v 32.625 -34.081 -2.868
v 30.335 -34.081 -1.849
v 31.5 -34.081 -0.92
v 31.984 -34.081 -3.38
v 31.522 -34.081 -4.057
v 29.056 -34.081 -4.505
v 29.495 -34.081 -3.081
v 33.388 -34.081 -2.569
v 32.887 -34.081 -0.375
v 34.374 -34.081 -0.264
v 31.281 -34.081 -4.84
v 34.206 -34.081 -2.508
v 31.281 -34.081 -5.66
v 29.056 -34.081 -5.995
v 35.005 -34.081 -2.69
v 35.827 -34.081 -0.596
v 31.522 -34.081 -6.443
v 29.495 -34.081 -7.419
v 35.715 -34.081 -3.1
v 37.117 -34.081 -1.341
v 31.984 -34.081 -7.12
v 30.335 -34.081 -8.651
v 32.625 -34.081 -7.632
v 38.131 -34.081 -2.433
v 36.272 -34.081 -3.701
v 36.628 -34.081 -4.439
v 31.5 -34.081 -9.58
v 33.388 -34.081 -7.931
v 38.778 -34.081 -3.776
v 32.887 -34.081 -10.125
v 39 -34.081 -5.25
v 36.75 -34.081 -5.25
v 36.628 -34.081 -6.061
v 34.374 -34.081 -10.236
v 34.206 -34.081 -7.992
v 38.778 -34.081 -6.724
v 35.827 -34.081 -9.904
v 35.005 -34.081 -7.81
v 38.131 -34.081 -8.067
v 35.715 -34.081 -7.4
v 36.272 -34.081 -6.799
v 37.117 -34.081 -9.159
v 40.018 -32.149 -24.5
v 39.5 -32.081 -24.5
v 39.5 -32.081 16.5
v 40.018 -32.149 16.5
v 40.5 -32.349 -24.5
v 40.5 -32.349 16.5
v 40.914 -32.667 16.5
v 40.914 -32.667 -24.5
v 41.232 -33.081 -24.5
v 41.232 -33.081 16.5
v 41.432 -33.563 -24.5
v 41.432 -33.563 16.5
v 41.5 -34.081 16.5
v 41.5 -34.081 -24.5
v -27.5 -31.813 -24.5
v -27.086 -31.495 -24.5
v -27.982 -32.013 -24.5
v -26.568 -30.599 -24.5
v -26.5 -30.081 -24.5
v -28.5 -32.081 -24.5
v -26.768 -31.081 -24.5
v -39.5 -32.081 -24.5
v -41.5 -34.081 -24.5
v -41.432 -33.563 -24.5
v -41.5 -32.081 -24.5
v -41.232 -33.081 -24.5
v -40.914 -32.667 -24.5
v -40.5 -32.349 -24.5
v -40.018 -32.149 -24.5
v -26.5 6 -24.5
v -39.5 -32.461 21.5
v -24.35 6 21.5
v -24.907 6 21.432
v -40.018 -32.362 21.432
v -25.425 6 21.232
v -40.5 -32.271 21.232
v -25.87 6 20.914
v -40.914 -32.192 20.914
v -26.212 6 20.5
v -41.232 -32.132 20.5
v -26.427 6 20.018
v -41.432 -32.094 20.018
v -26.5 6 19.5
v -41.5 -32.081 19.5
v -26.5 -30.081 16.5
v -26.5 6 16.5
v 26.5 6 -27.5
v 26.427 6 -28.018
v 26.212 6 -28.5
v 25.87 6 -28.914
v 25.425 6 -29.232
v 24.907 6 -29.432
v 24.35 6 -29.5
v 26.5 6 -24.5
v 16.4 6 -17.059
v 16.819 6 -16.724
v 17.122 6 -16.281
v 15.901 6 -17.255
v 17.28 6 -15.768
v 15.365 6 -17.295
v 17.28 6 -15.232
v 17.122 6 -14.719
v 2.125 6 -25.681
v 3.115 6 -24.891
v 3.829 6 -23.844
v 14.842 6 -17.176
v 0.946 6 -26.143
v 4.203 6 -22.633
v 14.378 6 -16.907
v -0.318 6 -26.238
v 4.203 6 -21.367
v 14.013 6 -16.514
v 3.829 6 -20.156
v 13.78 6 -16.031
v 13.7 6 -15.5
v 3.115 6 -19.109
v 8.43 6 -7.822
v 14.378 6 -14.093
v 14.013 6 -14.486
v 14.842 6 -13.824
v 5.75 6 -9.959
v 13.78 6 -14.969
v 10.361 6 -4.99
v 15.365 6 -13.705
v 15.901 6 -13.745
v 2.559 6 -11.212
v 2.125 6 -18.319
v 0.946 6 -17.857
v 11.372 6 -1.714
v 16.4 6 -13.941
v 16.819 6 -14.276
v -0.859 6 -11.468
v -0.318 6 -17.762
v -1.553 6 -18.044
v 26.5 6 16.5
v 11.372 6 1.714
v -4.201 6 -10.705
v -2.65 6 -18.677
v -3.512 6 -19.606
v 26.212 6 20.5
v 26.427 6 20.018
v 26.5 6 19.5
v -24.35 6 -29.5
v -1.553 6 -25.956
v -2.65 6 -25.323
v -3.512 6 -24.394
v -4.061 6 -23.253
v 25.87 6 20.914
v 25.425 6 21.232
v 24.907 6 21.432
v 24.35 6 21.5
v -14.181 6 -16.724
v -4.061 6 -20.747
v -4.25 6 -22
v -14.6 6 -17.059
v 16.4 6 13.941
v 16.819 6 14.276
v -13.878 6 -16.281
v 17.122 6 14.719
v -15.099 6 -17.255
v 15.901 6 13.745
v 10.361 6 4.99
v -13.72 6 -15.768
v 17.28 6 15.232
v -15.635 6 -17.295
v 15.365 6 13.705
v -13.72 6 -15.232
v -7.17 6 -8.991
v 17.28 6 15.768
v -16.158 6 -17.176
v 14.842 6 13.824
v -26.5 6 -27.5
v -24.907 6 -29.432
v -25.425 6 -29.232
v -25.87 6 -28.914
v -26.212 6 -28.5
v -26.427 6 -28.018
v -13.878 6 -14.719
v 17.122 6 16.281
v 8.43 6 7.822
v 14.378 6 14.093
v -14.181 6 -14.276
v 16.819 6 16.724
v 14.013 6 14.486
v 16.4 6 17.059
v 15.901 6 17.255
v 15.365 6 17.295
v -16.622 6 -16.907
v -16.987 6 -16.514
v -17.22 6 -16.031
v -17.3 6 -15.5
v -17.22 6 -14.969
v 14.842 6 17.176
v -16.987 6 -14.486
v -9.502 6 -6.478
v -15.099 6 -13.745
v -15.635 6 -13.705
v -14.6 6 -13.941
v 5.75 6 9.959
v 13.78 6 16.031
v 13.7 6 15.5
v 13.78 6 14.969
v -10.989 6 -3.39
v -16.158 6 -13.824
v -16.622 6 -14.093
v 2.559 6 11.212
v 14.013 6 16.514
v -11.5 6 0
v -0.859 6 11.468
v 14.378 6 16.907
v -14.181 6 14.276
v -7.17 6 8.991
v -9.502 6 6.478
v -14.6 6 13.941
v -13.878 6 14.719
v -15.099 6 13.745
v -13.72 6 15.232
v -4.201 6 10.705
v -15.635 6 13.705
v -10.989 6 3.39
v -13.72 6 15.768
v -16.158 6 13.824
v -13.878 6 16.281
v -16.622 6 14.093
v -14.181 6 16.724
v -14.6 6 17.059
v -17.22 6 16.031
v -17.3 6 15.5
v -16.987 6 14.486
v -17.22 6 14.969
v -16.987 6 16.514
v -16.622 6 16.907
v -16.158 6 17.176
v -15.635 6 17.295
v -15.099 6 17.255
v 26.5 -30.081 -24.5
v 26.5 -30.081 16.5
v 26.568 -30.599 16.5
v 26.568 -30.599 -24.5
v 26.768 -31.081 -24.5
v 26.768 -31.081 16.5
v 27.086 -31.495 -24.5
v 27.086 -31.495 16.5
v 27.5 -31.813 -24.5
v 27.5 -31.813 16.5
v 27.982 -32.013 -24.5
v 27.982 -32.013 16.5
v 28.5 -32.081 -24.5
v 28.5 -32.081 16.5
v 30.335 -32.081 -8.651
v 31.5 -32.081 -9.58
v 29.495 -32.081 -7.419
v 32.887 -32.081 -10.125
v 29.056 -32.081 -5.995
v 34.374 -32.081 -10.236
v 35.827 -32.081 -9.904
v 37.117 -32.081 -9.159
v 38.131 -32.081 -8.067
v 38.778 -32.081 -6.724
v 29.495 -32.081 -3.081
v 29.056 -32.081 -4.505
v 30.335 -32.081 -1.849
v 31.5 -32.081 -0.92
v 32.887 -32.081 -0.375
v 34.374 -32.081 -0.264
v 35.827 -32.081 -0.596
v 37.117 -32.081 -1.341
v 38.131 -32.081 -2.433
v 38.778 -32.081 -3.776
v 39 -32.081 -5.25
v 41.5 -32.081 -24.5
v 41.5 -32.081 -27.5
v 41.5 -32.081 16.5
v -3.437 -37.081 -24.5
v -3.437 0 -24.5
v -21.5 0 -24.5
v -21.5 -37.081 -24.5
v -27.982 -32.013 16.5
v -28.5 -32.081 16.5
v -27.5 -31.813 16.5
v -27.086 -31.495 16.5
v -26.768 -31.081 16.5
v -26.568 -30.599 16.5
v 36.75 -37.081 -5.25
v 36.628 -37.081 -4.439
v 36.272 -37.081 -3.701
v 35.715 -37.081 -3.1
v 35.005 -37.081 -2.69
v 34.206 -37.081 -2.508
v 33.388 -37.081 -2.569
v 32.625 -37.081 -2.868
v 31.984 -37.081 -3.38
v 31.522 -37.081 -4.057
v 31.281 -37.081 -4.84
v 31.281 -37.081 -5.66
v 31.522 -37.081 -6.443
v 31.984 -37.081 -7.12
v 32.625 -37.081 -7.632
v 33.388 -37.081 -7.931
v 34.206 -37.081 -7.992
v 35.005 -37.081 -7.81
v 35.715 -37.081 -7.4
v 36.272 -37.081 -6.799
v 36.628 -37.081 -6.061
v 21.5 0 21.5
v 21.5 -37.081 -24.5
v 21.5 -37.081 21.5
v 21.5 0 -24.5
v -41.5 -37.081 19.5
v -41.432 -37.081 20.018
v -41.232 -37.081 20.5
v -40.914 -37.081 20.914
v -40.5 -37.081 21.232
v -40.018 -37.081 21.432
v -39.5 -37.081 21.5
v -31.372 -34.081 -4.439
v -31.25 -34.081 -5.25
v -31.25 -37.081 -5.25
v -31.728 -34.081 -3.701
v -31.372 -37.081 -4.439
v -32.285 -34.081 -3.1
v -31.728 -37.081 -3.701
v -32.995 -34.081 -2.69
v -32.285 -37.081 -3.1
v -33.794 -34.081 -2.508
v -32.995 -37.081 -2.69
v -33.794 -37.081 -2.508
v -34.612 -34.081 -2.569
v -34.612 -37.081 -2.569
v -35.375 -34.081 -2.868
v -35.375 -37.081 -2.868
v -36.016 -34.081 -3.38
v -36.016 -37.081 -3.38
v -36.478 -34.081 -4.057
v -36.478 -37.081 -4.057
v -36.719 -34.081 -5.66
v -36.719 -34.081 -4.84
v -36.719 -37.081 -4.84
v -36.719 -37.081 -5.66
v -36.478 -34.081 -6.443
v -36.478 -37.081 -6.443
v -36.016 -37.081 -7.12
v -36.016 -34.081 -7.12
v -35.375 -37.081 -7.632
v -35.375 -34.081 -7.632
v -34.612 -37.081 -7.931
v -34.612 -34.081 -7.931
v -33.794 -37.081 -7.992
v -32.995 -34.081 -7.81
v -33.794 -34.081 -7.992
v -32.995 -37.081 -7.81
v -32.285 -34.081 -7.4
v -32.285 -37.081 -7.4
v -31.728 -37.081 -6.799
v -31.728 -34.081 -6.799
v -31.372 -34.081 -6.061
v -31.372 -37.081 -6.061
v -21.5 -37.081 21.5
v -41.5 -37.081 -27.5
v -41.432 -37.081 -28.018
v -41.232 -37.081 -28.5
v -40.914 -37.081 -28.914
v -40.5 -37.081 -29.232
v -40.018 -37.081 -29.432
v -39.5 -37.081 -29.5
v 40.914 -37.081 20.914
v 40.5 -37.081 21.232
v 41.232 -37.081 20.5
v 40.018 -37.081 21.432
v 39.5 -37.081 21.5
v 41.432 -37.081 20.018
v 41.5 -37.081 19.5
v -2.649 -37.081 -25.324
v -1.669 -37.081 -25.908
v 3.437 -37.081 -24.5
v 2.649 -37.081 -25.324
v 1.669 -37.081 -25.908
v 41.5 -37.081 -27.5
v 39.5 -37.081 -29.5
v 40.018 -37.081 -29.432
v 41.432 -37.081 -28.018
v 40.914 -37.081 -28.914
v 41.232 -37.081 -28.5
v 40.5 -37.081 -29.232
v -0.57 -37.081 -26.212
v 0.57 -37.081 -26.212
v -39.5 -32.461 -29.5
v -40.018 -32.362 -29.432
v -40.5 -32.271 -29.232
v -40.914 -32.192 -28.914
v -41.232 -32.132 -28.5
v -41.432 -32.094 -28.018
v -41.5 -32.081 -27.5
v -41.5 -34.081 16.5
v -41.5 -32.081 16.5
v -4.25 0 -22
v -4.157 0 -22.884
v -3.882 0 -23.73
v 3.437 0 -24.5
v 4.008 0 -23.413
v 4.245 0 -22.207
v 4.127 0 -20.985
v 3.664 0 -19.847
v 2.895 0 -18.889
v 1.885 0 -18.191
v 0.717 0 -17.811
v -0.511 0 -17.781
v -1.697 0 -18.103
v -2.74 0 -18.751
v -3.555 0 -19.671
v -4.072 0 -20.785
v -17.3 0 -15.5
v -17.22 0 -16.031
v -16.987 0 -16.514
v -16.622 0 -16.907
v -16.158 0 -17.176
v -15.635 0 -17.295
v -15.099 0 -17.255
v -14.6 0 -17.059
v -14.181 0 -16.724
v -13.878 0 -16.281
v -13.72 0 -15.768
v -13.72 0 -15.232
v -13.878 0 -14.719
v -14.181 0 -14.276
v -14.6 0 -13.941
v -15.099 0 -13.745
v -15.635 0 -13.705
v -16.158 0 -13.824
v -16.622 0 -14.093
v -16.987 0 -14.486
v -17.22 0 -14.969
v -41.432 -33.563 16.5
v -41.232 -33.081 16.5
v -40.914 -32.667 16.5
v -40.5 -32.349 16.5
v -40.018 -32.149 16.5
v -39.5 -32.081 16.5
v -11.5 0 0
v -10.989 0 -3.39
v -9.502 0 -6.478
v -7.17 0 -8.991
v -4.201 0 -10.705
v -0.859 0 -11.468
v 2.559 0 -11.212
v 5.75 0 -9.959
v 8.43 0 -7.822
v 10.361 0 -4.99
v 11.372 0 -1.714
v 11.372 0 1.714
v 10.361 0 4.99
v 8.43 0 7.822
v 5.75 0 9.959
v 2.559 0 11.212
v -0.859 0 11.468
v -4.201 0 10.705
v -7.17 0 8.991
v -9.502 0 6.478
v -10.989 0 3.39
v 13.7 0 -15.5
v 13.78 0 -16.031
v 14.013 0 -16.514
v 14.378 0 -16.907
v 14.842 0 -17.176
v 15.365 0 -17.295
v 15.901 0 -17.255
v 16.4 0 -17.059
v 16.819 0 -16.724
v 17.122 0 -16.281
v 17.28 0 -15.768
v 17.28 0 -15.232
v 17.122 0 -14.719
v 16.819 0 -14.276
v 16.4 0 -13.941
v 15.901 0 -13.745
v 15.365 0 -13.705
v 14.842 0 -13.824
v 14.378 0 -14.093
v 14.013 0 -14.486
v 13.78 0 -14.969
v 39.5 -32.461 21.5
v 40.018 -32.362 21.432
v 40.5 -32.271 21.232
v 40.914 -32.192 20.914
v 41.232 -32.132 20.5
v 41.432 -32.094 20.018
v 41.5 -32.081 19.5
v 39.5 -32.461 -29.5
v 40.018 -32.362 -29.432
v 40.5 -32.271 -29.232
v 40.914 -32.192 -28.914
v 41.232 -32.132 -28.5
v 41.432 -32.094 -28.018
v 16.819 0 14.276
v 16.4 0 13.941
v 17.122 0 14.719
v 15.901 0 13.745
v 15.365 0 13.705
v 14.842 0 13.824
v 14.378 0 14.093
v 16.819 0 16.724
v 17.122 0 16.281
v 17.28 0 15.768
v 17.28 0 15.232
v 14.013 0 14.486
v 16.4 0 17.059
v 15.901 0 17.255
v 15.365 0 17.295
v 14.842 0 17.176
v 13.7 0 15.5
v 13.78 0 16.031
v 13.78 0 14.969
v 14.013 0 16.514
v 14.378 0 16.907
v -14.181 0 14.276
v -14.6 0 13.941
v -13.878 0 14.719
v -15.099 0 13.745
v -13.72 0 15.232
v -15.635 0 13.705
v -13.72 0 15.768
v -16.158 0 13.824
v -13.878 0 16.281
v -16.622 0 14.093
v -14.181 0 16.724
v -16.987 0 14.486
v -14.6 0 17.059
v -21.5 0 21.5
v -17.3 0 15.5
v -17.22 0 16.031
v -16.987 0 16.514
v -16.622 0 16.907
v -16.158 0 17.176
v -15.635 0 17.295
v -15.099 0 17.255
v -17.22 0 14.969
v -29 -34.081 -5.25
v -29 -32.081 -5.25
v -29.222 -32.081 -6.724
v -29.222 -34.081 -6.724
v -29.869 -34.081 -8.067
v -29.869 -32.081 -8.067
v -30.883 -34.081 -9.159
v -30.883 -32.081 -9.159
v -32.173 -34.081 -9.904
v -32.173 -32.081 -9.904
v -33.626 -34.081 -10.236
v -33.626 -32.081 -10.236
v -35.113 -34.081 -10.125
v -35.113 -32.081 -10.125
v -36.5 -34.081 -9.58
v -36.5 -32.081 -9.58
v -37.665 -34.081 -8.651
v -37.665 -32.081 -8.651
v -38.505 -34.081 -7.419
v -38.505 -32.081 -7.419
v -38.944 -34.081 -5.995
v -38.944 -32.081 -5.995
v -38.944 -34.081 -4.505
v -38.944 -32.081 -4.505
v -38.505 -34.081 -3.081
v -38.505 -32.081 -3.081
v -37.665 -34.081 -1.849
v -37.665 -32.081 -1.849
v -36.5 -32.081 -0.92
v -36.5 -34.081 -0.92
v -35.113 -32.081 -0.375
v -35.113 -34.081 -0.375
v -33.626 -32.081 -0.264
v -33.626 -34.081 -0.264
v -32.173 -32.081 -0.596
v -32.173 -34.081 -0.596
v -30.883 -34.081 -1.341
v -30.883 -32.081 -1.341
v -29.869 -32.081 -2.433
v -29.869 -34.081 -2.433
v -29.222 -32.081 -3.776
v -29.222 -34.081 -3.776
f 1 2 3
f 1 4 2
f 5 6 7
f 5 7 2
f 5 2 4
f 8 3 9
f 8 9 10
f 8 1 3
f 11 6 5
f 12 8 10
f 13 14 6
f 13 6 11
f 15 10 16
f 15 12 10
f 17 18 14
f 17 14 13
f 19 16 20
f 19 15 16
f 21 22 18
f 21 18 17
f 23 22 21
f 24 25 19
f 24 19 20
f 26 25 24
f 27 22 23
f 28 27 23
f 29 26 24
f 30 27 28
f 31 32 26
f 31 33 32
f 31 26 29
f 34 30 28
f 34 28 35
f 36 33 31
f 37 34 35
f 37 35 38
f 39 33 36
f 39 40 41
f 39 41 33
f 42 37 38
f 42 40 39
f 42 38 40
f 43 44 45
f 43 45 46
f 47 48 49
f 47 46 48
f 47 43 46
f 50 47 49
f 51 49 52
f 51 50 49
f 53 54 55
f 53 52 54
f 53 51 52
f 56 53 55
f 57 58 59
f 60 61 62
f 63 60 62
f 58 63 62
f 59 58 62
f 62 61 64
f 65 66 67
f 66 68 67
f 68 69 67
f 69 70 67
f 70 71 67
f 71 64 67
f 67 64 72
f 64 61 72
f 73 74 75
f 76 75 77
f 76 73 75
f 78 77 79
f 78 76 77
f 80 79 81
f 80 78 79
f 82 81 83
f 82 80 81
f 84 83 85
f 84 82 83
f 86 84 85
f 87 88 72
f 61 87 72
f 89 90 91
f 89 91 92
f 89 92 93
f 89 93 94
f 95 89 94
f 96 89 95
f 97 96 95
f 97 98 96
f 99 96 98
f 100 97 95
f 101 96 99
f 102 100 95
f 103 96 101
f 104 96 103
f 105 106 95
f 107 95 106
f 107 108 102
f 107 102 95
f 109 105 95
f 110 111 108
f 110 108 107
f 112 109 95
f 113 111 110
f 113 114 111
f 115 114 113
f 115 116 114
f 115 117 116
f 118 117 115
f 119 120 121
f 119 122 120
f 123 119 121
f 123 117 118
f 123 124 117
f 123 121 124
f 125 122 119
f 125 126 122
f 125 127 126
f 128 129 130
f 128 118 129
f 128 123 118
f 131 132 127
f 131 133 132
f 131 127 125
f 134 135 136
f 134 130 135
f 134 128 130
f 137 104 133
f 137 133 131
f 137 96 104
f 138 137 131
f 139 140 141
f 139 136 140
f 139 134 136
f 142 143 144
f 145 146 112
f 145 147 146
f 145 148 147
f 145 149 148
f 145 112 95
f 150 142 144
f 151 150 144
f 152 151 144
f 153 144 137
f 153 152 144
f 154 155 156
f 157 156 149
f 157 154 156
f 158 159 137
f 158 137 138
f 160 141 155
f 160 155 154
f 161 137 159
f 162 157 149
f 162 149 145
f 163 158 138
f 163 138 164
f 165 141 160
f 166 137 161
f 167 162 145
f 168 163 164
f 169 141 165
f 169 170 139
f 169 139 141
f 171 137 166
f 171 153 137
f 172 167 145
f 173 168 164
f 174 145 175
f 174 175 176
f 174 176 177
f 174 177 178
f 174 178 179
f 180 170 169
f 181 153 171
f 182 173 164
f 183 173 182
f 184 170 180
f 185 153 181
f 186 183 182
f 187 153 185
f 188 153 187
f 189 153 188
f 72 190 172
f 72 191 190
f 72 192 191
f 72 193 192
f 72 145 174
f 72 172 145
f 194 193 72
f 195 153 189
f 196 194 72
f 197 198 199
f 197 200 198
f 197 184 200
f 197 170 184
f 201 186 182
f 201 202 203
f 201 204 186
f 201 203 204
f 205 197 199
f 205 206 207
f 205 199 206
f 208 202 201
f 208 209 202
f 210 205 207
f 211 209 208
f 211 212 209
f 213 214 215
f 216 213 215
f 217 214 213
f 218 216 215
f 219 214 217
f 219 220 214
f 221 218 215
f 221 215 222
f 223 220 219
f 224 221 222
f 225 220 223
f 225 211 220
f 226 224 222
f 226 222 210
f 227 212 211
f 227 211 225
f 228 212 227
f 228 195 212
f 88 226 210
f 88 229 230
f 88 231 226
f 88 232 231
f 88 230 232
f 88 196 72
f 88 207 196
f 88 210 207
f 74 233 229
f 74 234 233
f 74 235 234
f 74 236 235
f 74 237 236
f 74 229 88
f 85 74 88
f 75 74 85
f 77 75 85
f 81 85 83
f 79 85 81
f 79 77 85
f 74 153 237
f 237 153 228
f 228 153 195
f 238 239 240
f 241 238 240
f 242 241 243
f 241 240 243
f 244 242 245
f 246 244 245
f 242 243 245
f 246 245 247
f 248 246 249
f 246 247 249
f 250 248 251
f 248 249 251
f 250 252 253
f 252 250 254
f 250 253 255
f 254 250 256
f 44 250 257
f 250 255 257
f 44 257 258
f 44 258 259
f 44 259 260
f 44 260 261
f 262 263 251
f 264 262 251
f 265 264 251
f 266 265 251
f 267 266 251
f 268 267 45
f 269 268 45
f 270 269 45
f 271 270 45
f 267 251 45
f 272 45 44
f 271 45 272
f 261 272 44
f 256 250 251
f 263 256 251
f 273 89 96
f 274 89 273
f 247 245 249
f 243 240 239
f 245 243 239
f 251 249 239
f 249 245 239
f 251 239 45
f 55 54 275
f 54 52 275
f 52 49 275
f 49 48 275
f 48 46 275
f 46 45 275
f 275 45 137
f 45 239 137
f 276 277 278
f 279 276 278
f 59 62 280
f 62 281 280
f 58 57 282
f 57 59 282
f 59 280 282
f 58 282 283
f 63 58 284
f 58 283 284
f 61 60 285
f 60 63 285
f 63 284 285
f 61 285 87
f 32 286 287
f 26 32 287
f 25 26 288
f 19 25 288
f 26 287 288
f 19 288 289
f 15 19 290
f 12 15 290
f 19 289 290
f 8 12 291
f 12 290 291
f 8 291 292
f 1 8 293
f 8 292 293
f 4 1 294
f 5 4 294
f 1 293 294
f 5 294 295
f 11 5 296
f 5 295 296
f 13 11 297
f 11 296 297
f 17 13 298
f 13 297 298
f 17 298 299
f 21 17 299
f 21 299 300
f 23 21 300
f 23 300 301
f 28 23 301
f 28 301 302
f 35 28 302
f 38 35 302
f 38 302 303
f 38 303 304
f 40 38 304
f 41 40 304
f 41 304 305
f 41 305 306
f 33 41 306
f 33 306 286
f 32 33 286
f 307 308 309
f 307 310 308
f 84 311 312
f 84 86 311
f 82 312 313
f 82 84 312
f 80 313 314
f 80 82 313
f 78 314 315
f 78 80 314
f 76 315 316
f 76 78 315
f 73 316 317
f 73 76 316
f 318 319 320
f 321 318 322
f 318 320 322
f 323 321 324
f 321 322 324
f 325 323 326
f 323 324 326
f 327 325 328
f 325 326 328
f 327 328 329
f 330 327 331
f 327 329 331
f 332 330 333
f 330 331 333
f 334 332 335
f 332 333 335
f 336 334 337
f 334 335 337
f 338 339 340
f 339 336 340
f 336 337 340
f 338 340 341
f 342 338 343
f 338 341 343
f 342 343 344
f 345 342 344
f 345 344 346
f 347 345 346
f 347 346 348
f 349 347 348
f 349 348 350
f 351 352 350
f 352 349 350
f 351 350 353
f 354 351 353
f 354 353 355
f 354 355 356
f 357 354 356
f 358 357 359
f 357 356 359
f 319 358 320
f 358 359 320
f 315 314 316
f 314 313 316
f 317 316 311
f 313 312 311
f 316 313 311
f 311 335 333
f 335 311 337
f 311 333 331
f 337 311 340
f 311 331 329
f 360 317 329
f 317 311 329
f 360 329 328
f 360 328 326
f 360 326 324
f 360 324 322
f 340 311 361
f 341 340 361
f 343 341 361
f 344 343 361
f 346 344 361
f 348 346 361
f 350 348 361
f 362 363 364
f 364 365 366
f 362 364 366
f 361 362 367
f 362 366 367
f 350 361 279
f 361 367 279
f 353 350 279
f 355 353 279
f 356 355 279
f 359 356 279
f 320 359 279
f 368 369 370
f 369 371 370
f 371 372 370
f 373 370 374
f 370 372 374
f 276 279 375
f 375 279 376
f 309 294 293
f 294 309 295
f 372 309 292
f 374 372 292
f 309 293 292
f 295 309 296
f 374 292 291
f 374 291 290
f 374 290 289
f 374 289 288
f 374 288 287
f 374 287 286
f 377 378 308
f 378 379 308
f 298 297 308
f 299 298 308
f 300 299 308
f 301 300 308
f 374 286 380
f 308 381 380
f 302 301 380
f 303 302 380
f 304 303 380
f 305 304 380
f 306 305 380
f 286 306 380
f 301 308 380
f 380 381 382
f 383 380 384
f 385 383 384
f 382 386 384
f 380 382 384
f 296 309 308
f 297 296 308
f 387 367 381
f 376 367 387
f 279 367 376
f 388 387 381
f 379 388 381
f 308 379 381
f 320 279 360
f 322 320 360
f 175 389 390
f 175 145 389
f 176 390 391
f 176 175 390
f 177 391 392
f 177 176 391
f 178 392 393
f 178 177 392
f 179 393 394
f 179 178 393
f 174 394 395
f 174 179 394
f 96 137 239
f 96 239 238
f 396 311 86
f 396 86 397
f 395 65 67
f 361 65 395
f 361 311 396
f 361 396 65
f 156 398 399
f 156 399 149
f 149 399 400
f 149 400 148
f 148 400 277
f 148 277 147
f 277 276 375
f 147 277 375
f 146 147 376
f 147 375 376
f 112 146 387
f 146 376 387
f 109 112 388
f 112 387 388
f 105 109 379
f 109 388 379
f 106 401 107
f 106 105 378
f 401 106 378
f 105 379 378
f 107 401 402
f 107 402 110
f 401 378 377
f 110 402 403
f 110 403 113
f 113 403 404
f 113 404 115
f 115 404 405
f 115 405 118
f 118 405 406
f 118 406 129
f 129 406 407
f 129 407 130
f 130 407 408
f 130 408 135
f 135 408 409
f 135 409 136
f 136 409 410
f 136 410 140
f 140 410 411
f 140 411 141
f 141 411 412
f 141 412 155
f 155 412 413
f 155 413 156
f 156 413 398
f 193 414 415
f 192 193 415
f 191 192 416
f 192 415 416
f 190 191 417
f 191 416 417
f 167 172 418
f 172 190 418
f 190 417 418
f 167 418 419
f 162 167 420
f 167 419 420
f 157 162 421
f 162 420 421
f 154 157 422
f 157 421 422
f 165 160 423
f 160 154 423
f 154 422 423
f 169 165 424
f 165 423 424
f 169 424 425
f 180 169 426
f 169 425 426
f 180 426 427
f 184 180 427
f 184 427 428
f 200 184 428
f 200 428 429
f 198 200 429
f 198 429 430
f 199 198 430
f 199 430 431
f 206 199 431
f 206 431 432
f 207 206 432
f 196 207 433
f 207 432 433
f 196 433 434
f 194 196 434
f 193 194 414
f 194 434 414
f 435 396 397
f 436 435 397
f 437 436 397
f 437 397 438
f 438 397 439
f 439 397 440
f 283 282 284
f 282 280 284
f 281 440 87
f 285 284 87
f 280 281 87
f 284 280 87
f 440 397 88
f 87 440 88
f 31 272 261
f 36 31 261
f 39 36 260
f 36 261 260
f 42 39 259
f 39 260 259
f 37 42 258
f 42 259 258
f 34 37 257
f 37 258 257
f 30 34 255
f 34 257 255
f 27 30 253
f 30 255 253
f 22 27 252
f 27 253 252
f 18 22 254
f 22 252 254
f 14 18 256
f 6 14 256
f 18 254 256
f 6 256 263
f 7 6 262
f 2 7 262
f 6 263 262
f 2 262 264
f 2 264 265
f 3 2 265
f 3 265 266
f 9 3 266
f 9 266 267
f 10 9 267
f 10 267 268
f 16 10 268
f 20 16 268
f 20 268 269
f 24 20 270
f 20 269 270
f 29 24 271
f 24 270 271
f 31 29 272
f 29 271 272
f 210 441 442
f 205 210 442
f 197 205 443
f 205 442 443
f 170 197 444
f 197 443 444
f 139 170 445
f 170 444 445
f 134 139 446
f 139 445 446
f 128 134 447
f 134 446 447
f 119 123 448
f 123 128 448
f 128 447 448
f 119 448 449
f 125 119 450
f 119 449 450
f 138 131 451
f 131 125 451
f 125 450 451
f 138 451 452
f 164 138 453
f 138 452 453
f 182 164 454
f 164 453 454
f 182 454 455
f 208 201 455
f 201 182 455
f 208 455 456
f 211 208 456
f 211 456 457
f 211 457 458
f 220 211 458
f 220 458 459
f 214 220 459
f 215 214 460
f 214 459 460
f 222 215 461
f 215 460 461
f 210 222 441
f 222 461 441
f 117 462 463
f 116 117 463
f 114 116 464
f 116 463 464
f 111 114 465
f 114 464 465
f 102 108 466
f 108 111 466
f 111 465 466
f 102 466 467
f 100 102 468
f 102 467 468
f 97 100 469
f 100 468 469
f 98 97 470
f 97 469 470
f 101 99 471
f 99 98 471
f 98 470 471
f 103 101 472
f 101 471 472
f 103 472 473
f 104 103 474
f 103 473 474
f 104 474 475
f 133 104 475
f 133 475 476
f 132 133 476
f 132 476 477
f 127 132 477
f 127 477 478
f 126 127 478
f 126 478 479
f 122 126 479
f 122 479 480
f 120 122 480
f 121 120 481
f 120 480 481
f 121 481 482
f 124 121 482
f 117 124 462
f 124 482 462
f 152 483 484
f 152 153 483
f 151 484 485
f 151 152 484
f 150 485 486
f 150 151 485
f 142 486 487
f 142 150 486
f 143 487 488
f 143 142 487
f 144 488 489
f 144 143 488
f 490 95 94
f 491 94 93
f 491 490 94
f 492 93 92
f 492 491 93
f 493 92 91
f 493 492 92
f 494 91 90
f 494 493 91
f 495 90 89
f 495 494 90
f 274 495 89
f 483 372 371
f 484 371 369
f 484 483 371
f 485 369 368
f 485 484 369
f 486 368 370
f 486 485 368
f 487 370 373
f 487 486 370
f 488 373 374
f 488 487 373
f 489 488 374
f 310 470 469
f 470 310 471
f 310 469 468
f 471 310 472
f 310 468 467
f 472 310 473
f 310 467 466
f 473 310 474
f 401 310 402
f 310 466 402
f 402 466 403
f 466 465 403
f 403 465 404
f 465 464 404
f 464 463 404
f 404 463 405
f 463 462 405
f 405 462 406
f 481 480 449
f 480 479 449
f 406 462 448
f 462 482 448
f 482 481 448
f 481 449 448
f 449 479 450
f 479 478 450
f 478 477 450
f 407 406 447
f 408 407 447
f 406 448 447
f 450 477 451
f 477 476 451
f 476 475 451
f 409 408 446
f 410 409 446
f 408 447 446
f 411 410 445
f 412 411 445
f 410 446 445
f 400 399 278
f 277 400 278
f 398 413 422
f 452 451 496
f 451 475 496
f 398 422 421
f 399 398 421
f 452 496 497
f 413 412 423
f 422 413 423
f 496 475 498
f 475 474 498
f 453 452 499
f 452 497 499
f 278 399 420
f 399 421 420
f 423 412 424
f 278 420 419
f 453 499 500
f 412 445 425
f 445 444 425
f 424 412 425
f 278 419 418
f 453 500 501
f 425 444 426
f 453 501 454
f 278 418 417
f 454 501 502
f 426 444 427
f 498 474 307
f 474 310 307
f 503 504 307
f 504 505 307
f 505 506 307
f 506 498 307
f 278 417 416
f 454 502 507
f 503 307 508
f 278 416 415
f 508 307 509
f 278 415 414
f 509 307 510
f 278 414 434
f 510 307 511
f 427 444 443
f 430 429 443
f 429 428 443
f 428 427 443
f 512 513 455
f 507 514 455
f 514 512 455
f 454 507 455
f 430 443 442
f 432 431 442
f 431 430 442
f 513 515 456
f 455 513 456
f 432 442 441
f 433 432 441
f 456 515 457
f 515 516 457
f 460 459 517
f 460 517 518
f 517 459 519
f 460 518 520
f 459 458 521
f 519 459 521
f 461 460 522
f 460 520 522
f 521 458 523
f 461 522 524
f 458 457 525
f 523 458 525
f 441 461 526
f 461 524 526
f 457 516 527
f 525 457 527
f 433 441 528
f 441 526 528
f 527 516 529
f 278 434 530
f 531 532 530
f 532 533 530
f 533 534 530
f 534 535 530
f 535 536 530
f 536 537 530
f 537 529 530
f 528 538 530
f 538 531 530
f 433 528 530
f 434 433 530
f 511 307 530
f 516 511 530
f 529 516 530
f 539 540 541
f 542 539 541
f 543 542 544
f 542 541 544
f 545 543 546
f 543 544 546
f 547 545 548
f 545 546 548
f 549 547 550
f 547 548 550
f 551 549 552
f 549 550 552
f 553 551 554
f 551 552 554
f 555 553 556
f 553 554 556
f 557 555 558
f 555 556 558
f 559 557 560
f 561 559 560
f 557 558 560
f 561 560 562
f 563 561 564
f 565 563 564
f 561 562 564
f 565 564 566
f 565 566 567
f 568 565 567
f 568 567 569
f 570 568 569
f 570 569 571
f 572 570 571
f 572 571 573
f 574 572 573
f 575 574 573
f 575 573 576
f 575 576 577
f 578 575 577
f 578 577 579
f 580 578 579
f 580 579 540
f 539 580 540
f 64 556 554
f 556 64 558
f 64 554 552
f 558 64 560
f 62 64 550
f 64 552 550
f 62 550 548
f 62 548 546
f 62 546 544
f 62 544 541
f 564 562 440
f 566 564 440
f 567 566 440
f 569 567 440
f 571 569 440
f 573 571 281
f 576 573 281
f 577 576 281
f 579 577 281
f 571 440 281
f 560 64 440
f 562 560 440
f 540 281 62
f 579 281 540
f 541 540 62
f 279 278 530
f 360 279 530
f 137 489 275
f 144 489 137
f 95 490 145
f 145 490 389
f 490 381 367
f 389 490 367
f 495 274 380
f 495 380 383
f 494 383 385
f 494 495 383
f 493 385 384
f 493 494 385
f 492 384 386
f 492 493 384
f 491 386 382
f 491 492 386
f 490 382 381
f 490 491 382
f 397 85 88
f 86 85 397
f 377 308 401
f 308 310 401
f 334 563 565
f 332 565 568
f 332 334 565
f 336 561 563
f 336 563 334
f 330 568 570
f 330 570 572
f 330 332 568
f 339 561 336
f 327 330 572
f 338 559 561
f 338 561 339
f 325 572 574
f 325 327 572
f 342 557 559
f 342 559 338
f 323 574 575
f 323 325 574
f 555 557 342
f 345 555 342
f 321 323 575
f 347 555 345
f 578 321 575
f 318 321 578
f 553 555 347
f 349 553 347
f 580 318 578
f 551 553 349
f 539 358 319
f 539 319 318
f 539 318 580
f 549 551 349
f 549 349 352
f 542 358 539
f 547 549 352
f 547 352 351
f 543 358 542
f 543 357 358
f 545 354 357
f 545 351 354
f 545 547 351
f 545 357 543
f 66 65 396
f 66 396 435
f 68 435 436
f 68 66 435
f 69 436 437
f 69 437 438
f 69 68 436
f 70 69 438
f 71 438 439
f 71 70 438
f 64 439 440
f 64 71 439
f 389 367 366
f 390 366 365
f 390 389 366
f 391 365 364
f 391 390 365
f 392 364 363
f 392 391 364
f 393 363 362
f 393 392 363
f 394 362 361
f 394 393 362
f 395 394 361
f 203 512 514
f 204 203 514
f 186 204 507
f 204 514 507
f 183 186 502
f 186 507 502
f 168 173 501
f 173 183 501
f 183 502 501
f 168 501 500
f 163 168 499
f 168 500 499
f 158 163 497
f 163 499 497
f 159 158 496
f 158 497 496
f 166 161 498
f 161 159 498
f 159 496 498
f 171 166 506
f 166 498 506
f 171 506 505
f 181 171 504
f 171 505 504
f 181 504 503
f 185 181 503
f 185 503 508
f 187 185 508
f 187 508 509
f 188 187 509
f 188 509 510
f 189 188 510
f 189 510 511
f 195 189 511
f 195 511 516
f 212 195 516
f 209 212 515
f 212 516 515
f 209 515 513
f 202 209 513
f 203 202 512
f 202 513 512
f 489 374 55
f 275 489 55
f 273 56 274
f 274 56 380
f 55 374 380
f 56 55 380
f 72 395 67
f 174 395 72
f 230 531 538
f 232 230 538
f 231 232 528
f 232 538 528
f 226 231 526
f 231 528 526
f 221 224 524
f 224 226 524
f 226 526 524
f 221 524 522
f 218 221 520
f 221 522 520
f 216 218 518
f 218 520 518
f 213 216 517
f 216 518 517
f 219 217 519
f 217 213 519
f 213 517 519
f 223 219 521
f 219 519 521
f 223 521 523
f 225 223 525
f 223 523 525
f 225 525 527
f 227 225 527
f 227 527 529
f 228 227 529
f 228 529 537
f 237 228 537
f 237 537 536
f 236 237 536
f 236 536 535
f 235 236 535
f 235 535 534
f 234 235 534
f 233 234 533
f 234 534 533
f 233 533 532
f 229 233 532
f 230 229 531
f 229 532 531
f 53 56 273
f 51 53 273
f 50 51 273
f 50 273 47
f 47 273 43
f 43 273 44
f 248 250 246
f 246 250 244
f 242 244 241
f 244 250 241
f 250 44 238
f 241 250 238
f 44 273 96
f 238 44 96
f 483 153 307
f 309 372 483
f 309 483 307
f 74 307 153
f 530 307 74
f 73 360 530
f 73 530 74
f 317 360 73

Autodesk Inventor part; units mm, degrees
ref_plane "YZ Plane" through (0, 0, 0) normal (1, 0, 0) x (0, 1, 0)
ref_plane "XZ Plane" through (0, 0, 0) normal (0, 1, 0) x (-1, 0, 0)
ref_plane "XY Plane" through (0, 0, 0) normal (0, 0, 1) x (1, 0, 0)
sketch "Sketch1" plane through (0, 0, 0) normal (0, 1, 0) x (-1, 0, 0)
  circle A0 centre (0, 0) radius 11.5
  circle A1 centre (0, -22) radius 4.25
  line L0 (-21.5, 21.5) -> (21.5, 21.5)
  line L1 (21.5, 21.5) -> (21.5, -21.5)
  line L2 (21.5, -21.5) -> (-21.5, -21.5)
  line L3 (-21.5, -21.5) -> (-21.5, 21.5)
  line L4 (-21.5, 21.5) -> (21.5, -21.5) construction
  line L5 (21.5, 21.5) -> (-21.5, -21.5) construction
  line L6 (21.5, -21.5) -> (-21.5, -21.5)
  line L7 (-21.5, -21.5) -> (-21.5, -29.5)
  line L8 (-21.5, -29.5) -> (21.5, -29.5)
  line L9 (21.5, -29.5) -> (21.5, -21.5)
  circle A2 centre (15.5, 15.5) radius 1.8
  circle A3 centre (15.5, -15.5) radius 1.8
  circle A4 centre (-15.5, -15.5) radius 1.8
  circle A5 centre (-15.5, 15.5) radius 1.8
  point P0 (0, 0)
  dimension "d0" = 23
  dimension "d1" = 22
  dimension "d2" = 8.5
  dimension "d3" = 43
  dimension "d4" = 43
  dimension "d5" = 3.6
  dimension "d6" = 31
  dimension "d7" = 31
  dimension "d8" = 8
extrude "Extrusion1" add sketch "Sketch1" along normal blind 6 contours A1 L2 L9 L8 L7 | A1 L2 L3 L0 L1
sketch "Sketch2" plane through (0, 6, 0) normal (0, 1, 0) x (1, 0, 0)
  line L0 (-21.5, 29.5) -> (-21.5, -21.5) projected
  line L1 (-21.5, -21.5) -> (-26.5, -21.5)
  line L2 (-26.5, -21.5) -> (-26.5, 29.5)
  line L3 (-26.5, 29.5) -> (-21.5, 29.5)
  line L4 (-21.5, 29.5) -> (-21.5, -21.5)
  line L5 (21.5, -21.5) -> (26.5, -21.5)
  line L6 (26.5, -21.5) -> (26.5, 29.5)
  line L7 (26.5, 29.5) -> (21.5, 29.5)
  line L8 (21.5, 29.5) -> (21.5, -21.5)
  line L9 (-26.5, 29.5) -> (26.5, 29.5)
  line L10 (26.5, 29.5) -> (26.5, 24.5)
  line L11 (26.5, 24.5) -> (-26.5, 24.5)
  line L12 (-26.5, 24.5) -> (-26.5, 29.5)
  circle A0 centre (0, 22) radius 4.25 projected
  line L13 (21.5, 29.5) -> (-21.5, 29.5) projected
  point P0 (0, 0)
  point P1 (-21.5, 24.5)
  point P2 (-3.4369, 24.5)
  point P3 (3.4369, 24.5)
  point P4 (21.5, 24.5)
  point P5 (21.5, 29.5)
  dimension "d11" = 5
  dimension "d12" = 5
  dimension "d13" = 5
extrude "Extrusion2" add sketch "Sketch2" against normal blind 43.081 contours L9 L8 L11 A0 L0 | L0 L11 L2 L3 | L0 L1 L2 L11 | L7 L6 L11 L8 | L11 L6 L5 L8
sketch "Sketch4" plane through (0, -37.081, 0) normal (0, -1, 0) x (1, 0, 0)
  line L0 (-26.5, 21.5) -> (26.5, 21.5) projected
  line L1 (26.5, 21.5) -> (41.5, 21.5)
  line L2 (41.5, 21.5) -> (41.5, -29.5)
  line L3 (41.5, -29.5) -> (26.5, -29.5)
  line L4 (26.5, -29.5) -> (26.5, 21.5)
  line L5 (-26.5, -29.5) -> (-26.5, 21.5) projected
  line L6 (-26.5, 21.5) -> (-41.5, 21.5)
  line L7 (-41.5, 21.5) -> (-41.5, -29.5)
  line L8 (-41.5, -29.5) -> (-26.5, -29.5)
  line L9 (-26.5, -29.5) -> (-26.5, 21.5)
  line L10 (-26.5, -29.5) -> (26.5, -29.5) projected
  circle A0 centre (-34, -5.25) radius 2.75
  circle A1 centre (34, -5.25) radius 2.75
  point P0 (0, 0)
  point P1 (-26.5, -29.5)
  dimension "d21" = 15
  dimension "d22" = 5.5
  dimension "d23" = 15
  dimension "d24" = 7.5
  dimension "d25" = 7.5
  dimension "d29" = 26.75
extrude "Extrusion3" add sketch "Sketch4" against normal blind 5 contours L5 L8 L7 L6 | L1 L2 L3 L4
sketch "Sketch5" plane through (0, -32.081, 0) normal (0, 1, 0) x (1, 0, 0)
  circle A0 centre (-34, 5.25) radius 2.75 projected
  circle A1 centre (-34, 5.25) radius 5
  circle A2 centre (34, 5.25) radius 2.75 projected
  circle A3 centre (34, 5.25) radius 5
  point P0 (0, 0)
  dimension "d30" = 10
extrude "Extrusion4" cut sketch "Sketch5" against normal blind 2 contours A1 | A2 | A3
sketch "Sketch7" plane through (26.5, 6, -29.5) normal (0, 0, -1) x (-1, 0, 0)
  line L0 (53, 0) -> (0, 0) projected
  line L1 (-15, -43.081) -> (-15, -38.081) projected
  line L2 (0, 0) -> (-15, -38.081)
  line L3 (-15, -38.081) -> (0, -38.081)
  line L4 (0, 0) -> (0, -38.081) projected
  line L5 (0, -38.081) -> (0, 0)
  line L6 (53, 0) -> (53, -38.081) projected
  line L7 (53, 0) -> (53, -38.081)
  line L8 (68, -38.081) -> (53, -38.081) projected
  line L9 (53, -38.081) -> (68, -38.081)
  line L10 (68, -38.081) -> (53, 0)
  point P0 (26.5, -6)
extrude "Extrusion5" add sketch "Sketch7" against normal blind 5
sketch "Sketch8" plane through (-21.5, 0, 21.5) normal (0, 0, 1) x (1, 0, 0)
  line L0 (-5, -32.081) -> (-20, -32.081) projected
  line L1 (-5, 6) -> (-5, -32.081) projected
  line L2 (-5, 6) -> (-20, -32.081) projected
  line L3 (63, -32.081) -> (48, -32.081) projected
  line L4 (63, -32.081) -> (48, 6) projected
  line L5 (48, -32.081) -> (48, 6) projected
  point P0 (21.5, 0)
extrude "Extrusion6" add sketch "Sketch8" against normal blind 5
fillet "Fillet1" radius 2 4 edges at (41.5, -32.081, -4) (-41.5, -32.081, -4) (-26.5, -32.081, -4) (26.5, -32.081, -4)
fillet "Fillet2" radius 2 8 edges at (-41.5, -34.581, 21.5) (-41.5, -34.581, -29.5) (41.5, -34.581, 21.5) (41.5, -34.581, -29.5) (34, -13.0405, 21.5) (34, -13.0405, -29.5) (-34, -13.0405, 21.5) (-34, -13.0405, -29.5)
sketch "Sketch10" plane through (0, -37.081, 0) normal (0, -1, 0) x (1, 0, 0)
  line L0 (-46.933, 35.2152) -> (46.933, 35.2152)
  line L1 (46.933, 35.2152) -> (46.933, -35.2152)
  line L2 (46.933, -35.2152) -> (-46.933, -35.2152)
  line L3 (-46.933, -35.2152) -> (-46.933, 35.2152)
  line L4 (-46.933, 35.2152) -> (46.933, -35.2152) construction
  line L5 (46.933, 35.2152) -> (-46.933, -35.2152) construction
  point P0 (0, 0)
sketch "Sketch9" plane through (0, 5, 0) normal (0, 1, 0) x (1, 0, 0)
  line L0 (41, 29) -> (41, -71) projected
  line L1 (41, 29) -> (-55.9789, 29)
  line L2 (-55.9789, 29) -> (-55.9789, -21)
  line L3 (-55.9789, -21) -> (41, -21)
  line L4 (41, -21) -> (41, 29)
  point P0 (0, 0)
  point P1 (41, -21)
properties part number "zmotorsupport"
